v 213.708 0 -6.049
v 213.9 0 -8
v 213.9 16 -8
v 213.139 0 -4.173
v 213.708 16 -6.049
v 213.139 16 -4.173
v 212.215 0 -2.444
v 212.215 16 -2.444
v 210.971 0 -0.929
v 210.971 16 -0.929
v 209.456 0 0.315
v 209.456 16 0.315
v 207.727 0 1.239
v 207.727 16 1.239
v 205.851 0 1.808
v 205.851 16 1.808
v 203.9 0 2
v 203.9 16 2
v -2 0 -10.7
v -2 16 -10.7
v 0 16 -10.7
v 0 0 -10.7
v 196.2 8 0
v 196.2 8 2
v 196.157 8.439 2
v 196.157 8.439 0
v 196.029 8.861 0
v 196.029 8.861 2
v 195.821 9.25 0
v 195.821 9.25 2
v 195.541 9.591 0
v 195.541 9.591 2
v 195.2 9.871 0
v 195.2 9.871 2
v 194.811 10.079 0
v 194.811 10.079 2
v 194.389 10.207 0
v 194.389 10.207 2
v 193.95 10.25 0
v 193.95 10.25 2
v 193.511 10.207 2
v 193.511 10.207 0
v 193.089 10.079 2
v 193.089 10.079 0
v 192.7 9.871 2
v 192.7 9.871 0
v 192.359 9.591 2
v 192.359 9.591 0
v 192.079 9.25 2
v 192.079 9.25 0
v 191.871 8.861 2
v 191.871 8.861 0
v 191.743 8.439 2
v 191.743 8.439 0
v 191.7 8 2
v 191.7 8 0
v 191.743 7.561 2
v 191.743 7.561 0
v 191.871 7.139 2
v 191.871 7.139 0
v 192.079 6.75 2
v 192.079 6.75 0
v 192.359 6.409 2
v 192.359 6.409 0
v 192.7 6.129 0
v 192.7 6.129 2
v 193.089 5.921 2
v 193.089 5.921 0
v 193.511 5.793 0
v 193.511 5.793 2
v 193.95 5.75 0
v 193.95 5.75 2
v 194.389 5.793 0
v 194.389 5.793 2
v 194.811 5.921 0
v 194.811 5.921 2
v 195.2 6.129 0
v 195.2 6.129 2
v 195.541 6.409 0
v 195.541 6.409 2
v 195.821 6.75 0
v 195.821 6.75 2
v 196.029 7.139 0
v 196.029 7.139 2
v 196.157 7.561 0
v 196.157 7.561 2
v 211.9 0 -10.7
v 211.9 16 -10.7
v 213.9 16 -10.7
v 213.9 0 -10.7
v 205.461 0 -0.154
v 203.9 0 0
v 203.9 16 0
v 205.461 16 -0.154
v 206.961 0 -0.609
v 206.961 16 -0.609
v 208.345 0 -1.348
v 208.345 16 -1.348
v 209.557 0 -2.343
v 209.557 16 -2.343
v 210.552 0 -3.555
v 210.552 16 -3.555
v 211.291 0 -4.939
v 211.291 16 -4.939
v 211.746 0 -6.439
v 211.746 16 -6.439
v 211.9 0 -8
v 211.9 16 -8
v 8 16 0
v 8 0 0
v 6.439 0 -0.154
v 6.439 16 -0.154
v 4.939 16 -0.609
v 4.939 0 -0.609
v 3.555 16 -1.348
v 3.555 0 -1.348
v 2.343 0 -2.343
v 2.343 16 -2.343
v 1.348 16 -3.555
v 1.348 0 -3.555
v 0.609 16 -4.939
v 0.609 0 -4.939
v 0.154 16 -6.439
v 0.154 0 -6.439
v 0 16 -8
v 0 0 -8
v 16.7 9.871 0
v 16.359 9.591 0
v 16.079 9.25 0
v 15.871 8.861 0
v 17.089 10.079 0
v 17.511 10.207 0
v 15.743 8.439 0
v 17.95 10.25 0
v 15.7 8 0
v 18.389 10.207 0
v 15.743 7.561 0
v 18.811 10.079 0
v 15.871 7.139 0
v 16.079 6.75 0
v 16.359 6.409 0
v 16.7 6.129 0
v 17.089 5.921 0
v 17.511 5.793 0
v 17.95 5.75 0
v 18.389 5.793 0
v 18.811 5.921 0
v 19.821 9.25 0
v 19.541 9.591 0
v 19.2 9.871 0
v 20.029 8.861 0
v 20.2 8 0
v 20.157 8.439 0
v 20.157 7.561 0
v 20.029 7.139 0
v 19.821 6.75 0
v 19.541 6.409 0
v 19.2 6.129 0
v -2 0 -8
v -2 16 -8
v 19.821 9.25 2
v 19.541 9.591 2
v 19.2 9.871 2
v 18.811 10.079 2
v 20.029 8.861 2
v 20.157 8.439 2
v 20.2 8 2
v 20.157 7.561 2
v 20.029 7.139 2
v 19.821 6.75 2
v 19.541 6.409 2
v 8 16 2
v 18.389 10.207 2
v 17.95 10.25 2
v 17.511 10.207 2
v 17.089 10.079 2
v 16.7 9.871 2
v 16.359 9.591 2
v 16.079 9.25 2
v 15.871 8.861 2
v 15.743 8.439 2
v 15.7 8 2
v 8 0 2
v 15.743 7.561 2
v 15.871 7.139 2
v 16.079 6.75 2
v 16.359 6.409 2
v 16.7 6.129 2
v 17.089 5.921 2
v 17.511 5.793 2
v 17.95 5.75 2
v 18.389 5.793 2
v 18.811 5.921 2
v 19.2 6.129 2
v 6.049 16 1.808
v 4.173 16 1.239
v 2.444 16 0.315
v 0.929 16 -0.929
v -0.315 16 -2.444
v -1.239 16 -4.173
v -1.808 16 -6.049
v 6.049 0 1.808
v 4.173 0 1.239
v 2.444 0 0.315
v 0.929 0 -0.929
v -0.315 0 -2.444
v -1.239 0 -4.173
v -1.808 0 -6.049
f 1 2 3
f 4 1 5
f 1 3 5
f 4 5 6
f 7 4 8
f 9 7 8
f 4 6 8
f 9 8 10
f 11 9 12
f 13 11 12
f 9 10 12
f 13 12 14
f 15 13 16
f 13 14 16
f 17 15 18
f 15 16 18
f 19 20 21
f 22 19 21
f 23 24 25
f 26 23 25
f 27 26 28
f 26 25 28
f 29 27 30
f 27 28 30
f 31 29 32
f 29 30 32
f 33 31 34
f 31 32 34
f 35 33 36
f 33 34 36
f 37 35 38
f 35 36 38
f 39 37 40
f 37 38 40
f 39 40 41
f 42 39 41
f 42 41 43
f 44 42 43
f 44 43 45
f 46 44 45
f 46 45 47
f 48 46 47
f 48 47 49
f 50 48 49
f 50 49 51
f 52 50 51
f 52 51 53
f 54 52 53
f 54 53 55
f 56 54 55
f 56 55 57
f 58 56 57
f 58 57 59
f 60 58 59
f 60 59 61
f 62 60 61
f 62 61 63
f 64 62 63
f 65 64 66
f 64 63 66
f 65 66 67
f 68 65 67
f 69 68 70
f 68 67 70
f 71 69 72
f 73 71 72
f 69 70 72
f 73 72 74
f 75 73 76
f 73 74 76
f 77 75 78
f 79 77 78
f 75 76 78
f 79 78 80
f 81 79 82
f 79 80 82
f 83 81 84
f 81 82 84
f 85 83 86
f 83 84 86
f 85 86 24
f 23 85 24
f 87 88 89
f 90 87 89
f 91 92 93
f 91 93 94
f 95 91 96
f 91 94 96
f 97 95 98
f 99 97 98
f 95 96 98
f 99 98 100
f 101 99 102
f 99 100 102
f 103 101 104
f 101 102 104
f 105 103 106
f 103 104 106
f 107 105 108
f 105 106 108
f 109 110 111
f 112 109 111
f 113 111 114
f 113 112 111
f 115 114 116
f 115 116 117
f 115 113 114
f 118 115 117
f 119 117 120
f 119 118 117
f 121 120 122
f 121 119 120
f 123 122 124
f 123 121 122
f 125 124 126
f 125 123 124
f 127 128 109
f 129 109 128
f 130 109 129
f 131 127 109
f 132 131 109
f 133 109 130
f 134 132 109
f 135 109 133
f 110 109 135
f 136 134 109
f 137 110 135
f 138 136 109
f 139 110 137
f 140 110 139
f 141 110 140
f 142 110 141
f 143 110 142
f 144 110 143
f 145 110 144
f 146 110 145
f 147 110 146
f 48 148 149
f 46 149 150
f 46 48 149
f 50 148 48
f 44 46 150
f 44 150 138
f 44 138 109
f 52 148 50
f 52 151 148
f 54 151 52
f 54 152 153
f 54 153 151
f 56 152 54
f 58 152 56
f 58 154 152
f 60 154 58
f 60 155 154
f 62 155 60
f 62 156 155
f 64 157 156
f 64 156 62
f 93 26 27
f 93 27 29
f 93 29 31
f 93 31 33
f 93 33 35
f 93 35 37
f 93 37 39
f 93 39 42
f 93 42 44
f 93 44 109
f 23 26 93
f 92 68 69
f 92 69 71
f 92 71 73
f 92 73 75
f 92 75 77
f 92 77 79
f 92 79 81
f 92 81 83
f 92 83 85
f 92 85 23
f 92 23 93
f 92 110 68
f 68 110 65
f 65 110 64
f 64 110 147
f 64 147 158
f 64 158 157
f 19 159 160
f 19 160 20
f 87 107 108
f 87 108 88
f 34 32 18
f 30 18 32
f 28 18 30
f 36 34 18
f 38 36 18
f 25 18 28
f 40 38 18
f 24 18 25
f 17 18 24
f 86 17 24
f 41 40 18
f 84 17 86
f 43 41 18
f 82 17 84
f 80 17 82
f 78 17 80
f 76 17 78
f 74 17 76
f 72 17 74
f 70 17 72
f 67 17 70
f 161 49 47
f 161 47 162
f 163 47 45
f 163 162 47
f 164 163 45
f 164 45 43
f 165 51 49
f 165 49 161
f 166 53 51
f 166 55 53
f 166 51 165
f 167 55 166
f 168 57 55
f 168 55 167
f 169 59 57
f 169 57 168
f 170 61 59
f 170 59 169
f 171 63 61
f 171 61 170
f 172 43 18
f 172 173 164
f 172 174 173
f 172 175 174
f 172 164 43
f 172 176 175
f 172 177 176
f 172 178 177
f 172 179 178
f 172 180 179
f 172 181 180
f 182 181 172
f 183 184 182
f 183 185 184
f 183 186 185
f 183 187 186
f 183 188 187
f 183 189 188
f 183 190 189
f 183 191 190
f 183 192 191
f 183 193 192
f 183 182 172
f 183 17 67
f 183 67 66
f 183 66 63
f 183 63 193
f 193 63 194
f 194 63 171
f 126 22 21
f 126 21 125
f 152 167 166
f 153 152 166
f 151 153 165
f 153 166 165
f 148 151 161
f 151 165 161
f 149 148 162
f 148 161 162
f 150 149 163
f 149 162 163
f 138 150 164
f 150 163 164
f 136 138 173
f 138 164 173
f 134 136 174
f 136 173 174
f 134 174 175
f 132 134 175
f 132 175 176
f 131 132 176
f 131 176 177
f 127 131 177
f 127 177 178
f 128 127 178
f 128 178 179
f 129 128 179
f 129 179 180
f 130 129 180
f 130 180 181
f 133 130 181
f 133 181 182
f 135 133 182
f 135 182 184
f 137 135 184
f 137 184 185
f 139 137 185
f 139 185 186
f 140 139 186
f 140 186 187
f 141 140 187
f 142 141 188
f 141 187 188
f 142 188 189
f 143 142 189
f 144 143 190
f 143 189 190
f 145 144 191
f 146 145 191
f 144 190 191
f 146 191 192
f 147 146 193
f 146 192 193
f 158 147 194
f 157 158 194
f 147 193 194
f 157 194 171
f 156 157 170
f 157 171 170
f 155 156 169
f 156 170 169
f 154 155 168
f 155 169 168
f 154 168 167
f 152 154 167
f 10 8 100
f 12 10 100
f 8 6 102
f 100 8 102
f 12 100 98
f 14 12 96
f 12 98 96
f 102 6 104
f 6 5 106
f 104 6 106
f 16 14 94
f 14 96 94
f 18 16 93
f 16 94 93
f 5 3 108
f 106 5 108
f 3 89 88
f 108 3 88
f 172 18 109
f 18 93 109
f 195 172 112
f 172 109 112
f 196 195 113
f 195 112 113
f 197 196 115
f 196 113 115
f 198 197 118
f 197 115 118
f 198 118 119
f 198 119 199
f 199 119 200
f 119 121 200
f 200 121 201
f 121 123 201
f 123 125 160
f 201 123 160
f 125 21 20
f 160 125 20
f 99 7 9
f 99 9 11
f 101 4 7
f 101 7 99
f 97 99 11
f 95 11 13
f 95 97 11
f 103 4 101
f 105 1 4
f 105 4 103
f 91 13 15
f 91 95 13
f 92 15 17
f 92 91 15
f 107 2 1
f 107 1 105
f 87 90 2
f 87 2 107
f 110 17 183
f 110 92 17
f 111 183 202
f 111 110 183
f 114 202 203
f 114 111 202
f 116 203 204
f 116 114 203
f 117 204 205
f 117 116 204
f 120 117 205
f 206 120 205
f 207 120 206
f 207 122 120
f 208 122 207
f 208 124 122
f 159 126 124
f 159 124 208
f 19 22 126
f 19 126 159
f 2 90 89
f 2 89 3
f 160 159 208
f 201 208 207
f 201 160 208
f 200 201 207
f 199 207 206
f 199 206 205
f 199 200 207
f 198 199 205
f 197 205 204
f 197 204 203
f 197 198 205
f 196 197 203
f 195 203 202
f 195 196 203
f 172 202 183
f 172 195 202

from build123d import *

# Parameters (mm, degrees)
BOSS_EXTRUDE1_DEPTH = 16
FILLET1_R           = 8
FILLET2_R           = 10
SKETCH2_R           = 2.25
CUT_EXTRUDE1_DEPTH  = 13.7


with BuildPart() as part:
    # Sketch1 → Boss-Extrude1 (new body)
    with BuildSketch(Plane(origin=(0, 0, 0), x_dir=(1, 0, 0), z_dir=(0, 1, 0))):
        Polygon((0, 0), (211.9, 0), (211.9, 10.7), (213.9, 10.7), (213.9, -2), (-2, -2), (-2, 10.7), (0, 10.7), align=None)
    extrude(amount=BOSS_EXTRUDE1_DEPTH)

    # Fillet1
    fillet1_edges = [part.edges().sort_by_distance(p)[0] for p in [
        (0, 8, 0),
        (211.9, 8, 0),
    ]]
    fillet(fillet1_edges, radius=FILLET1_R)

    # Fillet2
    fillet2_edges = [part.edges().sort_by_distance(p)[0] for p in [
        (213.9, 8, 2),
        (-2, 8, 2),
    ]]
    fillet(fillet2_edges, radius=FILLET2_R)

    # Sketch2 → Cut-Extrude1 (cut, through all)
    with BuildSketch(Plane.XY.offset(2)):
        with Locations((17.95, 8)):
            Circle(SKETCH2_R)
        with Locations((193.95, 8)):
            Circle(SKETCH2_R)
    extrude(amount=-CUT_EXTRUDE1_DEPTH, mode=Mode.SUBTRACT)


solid = part.part
